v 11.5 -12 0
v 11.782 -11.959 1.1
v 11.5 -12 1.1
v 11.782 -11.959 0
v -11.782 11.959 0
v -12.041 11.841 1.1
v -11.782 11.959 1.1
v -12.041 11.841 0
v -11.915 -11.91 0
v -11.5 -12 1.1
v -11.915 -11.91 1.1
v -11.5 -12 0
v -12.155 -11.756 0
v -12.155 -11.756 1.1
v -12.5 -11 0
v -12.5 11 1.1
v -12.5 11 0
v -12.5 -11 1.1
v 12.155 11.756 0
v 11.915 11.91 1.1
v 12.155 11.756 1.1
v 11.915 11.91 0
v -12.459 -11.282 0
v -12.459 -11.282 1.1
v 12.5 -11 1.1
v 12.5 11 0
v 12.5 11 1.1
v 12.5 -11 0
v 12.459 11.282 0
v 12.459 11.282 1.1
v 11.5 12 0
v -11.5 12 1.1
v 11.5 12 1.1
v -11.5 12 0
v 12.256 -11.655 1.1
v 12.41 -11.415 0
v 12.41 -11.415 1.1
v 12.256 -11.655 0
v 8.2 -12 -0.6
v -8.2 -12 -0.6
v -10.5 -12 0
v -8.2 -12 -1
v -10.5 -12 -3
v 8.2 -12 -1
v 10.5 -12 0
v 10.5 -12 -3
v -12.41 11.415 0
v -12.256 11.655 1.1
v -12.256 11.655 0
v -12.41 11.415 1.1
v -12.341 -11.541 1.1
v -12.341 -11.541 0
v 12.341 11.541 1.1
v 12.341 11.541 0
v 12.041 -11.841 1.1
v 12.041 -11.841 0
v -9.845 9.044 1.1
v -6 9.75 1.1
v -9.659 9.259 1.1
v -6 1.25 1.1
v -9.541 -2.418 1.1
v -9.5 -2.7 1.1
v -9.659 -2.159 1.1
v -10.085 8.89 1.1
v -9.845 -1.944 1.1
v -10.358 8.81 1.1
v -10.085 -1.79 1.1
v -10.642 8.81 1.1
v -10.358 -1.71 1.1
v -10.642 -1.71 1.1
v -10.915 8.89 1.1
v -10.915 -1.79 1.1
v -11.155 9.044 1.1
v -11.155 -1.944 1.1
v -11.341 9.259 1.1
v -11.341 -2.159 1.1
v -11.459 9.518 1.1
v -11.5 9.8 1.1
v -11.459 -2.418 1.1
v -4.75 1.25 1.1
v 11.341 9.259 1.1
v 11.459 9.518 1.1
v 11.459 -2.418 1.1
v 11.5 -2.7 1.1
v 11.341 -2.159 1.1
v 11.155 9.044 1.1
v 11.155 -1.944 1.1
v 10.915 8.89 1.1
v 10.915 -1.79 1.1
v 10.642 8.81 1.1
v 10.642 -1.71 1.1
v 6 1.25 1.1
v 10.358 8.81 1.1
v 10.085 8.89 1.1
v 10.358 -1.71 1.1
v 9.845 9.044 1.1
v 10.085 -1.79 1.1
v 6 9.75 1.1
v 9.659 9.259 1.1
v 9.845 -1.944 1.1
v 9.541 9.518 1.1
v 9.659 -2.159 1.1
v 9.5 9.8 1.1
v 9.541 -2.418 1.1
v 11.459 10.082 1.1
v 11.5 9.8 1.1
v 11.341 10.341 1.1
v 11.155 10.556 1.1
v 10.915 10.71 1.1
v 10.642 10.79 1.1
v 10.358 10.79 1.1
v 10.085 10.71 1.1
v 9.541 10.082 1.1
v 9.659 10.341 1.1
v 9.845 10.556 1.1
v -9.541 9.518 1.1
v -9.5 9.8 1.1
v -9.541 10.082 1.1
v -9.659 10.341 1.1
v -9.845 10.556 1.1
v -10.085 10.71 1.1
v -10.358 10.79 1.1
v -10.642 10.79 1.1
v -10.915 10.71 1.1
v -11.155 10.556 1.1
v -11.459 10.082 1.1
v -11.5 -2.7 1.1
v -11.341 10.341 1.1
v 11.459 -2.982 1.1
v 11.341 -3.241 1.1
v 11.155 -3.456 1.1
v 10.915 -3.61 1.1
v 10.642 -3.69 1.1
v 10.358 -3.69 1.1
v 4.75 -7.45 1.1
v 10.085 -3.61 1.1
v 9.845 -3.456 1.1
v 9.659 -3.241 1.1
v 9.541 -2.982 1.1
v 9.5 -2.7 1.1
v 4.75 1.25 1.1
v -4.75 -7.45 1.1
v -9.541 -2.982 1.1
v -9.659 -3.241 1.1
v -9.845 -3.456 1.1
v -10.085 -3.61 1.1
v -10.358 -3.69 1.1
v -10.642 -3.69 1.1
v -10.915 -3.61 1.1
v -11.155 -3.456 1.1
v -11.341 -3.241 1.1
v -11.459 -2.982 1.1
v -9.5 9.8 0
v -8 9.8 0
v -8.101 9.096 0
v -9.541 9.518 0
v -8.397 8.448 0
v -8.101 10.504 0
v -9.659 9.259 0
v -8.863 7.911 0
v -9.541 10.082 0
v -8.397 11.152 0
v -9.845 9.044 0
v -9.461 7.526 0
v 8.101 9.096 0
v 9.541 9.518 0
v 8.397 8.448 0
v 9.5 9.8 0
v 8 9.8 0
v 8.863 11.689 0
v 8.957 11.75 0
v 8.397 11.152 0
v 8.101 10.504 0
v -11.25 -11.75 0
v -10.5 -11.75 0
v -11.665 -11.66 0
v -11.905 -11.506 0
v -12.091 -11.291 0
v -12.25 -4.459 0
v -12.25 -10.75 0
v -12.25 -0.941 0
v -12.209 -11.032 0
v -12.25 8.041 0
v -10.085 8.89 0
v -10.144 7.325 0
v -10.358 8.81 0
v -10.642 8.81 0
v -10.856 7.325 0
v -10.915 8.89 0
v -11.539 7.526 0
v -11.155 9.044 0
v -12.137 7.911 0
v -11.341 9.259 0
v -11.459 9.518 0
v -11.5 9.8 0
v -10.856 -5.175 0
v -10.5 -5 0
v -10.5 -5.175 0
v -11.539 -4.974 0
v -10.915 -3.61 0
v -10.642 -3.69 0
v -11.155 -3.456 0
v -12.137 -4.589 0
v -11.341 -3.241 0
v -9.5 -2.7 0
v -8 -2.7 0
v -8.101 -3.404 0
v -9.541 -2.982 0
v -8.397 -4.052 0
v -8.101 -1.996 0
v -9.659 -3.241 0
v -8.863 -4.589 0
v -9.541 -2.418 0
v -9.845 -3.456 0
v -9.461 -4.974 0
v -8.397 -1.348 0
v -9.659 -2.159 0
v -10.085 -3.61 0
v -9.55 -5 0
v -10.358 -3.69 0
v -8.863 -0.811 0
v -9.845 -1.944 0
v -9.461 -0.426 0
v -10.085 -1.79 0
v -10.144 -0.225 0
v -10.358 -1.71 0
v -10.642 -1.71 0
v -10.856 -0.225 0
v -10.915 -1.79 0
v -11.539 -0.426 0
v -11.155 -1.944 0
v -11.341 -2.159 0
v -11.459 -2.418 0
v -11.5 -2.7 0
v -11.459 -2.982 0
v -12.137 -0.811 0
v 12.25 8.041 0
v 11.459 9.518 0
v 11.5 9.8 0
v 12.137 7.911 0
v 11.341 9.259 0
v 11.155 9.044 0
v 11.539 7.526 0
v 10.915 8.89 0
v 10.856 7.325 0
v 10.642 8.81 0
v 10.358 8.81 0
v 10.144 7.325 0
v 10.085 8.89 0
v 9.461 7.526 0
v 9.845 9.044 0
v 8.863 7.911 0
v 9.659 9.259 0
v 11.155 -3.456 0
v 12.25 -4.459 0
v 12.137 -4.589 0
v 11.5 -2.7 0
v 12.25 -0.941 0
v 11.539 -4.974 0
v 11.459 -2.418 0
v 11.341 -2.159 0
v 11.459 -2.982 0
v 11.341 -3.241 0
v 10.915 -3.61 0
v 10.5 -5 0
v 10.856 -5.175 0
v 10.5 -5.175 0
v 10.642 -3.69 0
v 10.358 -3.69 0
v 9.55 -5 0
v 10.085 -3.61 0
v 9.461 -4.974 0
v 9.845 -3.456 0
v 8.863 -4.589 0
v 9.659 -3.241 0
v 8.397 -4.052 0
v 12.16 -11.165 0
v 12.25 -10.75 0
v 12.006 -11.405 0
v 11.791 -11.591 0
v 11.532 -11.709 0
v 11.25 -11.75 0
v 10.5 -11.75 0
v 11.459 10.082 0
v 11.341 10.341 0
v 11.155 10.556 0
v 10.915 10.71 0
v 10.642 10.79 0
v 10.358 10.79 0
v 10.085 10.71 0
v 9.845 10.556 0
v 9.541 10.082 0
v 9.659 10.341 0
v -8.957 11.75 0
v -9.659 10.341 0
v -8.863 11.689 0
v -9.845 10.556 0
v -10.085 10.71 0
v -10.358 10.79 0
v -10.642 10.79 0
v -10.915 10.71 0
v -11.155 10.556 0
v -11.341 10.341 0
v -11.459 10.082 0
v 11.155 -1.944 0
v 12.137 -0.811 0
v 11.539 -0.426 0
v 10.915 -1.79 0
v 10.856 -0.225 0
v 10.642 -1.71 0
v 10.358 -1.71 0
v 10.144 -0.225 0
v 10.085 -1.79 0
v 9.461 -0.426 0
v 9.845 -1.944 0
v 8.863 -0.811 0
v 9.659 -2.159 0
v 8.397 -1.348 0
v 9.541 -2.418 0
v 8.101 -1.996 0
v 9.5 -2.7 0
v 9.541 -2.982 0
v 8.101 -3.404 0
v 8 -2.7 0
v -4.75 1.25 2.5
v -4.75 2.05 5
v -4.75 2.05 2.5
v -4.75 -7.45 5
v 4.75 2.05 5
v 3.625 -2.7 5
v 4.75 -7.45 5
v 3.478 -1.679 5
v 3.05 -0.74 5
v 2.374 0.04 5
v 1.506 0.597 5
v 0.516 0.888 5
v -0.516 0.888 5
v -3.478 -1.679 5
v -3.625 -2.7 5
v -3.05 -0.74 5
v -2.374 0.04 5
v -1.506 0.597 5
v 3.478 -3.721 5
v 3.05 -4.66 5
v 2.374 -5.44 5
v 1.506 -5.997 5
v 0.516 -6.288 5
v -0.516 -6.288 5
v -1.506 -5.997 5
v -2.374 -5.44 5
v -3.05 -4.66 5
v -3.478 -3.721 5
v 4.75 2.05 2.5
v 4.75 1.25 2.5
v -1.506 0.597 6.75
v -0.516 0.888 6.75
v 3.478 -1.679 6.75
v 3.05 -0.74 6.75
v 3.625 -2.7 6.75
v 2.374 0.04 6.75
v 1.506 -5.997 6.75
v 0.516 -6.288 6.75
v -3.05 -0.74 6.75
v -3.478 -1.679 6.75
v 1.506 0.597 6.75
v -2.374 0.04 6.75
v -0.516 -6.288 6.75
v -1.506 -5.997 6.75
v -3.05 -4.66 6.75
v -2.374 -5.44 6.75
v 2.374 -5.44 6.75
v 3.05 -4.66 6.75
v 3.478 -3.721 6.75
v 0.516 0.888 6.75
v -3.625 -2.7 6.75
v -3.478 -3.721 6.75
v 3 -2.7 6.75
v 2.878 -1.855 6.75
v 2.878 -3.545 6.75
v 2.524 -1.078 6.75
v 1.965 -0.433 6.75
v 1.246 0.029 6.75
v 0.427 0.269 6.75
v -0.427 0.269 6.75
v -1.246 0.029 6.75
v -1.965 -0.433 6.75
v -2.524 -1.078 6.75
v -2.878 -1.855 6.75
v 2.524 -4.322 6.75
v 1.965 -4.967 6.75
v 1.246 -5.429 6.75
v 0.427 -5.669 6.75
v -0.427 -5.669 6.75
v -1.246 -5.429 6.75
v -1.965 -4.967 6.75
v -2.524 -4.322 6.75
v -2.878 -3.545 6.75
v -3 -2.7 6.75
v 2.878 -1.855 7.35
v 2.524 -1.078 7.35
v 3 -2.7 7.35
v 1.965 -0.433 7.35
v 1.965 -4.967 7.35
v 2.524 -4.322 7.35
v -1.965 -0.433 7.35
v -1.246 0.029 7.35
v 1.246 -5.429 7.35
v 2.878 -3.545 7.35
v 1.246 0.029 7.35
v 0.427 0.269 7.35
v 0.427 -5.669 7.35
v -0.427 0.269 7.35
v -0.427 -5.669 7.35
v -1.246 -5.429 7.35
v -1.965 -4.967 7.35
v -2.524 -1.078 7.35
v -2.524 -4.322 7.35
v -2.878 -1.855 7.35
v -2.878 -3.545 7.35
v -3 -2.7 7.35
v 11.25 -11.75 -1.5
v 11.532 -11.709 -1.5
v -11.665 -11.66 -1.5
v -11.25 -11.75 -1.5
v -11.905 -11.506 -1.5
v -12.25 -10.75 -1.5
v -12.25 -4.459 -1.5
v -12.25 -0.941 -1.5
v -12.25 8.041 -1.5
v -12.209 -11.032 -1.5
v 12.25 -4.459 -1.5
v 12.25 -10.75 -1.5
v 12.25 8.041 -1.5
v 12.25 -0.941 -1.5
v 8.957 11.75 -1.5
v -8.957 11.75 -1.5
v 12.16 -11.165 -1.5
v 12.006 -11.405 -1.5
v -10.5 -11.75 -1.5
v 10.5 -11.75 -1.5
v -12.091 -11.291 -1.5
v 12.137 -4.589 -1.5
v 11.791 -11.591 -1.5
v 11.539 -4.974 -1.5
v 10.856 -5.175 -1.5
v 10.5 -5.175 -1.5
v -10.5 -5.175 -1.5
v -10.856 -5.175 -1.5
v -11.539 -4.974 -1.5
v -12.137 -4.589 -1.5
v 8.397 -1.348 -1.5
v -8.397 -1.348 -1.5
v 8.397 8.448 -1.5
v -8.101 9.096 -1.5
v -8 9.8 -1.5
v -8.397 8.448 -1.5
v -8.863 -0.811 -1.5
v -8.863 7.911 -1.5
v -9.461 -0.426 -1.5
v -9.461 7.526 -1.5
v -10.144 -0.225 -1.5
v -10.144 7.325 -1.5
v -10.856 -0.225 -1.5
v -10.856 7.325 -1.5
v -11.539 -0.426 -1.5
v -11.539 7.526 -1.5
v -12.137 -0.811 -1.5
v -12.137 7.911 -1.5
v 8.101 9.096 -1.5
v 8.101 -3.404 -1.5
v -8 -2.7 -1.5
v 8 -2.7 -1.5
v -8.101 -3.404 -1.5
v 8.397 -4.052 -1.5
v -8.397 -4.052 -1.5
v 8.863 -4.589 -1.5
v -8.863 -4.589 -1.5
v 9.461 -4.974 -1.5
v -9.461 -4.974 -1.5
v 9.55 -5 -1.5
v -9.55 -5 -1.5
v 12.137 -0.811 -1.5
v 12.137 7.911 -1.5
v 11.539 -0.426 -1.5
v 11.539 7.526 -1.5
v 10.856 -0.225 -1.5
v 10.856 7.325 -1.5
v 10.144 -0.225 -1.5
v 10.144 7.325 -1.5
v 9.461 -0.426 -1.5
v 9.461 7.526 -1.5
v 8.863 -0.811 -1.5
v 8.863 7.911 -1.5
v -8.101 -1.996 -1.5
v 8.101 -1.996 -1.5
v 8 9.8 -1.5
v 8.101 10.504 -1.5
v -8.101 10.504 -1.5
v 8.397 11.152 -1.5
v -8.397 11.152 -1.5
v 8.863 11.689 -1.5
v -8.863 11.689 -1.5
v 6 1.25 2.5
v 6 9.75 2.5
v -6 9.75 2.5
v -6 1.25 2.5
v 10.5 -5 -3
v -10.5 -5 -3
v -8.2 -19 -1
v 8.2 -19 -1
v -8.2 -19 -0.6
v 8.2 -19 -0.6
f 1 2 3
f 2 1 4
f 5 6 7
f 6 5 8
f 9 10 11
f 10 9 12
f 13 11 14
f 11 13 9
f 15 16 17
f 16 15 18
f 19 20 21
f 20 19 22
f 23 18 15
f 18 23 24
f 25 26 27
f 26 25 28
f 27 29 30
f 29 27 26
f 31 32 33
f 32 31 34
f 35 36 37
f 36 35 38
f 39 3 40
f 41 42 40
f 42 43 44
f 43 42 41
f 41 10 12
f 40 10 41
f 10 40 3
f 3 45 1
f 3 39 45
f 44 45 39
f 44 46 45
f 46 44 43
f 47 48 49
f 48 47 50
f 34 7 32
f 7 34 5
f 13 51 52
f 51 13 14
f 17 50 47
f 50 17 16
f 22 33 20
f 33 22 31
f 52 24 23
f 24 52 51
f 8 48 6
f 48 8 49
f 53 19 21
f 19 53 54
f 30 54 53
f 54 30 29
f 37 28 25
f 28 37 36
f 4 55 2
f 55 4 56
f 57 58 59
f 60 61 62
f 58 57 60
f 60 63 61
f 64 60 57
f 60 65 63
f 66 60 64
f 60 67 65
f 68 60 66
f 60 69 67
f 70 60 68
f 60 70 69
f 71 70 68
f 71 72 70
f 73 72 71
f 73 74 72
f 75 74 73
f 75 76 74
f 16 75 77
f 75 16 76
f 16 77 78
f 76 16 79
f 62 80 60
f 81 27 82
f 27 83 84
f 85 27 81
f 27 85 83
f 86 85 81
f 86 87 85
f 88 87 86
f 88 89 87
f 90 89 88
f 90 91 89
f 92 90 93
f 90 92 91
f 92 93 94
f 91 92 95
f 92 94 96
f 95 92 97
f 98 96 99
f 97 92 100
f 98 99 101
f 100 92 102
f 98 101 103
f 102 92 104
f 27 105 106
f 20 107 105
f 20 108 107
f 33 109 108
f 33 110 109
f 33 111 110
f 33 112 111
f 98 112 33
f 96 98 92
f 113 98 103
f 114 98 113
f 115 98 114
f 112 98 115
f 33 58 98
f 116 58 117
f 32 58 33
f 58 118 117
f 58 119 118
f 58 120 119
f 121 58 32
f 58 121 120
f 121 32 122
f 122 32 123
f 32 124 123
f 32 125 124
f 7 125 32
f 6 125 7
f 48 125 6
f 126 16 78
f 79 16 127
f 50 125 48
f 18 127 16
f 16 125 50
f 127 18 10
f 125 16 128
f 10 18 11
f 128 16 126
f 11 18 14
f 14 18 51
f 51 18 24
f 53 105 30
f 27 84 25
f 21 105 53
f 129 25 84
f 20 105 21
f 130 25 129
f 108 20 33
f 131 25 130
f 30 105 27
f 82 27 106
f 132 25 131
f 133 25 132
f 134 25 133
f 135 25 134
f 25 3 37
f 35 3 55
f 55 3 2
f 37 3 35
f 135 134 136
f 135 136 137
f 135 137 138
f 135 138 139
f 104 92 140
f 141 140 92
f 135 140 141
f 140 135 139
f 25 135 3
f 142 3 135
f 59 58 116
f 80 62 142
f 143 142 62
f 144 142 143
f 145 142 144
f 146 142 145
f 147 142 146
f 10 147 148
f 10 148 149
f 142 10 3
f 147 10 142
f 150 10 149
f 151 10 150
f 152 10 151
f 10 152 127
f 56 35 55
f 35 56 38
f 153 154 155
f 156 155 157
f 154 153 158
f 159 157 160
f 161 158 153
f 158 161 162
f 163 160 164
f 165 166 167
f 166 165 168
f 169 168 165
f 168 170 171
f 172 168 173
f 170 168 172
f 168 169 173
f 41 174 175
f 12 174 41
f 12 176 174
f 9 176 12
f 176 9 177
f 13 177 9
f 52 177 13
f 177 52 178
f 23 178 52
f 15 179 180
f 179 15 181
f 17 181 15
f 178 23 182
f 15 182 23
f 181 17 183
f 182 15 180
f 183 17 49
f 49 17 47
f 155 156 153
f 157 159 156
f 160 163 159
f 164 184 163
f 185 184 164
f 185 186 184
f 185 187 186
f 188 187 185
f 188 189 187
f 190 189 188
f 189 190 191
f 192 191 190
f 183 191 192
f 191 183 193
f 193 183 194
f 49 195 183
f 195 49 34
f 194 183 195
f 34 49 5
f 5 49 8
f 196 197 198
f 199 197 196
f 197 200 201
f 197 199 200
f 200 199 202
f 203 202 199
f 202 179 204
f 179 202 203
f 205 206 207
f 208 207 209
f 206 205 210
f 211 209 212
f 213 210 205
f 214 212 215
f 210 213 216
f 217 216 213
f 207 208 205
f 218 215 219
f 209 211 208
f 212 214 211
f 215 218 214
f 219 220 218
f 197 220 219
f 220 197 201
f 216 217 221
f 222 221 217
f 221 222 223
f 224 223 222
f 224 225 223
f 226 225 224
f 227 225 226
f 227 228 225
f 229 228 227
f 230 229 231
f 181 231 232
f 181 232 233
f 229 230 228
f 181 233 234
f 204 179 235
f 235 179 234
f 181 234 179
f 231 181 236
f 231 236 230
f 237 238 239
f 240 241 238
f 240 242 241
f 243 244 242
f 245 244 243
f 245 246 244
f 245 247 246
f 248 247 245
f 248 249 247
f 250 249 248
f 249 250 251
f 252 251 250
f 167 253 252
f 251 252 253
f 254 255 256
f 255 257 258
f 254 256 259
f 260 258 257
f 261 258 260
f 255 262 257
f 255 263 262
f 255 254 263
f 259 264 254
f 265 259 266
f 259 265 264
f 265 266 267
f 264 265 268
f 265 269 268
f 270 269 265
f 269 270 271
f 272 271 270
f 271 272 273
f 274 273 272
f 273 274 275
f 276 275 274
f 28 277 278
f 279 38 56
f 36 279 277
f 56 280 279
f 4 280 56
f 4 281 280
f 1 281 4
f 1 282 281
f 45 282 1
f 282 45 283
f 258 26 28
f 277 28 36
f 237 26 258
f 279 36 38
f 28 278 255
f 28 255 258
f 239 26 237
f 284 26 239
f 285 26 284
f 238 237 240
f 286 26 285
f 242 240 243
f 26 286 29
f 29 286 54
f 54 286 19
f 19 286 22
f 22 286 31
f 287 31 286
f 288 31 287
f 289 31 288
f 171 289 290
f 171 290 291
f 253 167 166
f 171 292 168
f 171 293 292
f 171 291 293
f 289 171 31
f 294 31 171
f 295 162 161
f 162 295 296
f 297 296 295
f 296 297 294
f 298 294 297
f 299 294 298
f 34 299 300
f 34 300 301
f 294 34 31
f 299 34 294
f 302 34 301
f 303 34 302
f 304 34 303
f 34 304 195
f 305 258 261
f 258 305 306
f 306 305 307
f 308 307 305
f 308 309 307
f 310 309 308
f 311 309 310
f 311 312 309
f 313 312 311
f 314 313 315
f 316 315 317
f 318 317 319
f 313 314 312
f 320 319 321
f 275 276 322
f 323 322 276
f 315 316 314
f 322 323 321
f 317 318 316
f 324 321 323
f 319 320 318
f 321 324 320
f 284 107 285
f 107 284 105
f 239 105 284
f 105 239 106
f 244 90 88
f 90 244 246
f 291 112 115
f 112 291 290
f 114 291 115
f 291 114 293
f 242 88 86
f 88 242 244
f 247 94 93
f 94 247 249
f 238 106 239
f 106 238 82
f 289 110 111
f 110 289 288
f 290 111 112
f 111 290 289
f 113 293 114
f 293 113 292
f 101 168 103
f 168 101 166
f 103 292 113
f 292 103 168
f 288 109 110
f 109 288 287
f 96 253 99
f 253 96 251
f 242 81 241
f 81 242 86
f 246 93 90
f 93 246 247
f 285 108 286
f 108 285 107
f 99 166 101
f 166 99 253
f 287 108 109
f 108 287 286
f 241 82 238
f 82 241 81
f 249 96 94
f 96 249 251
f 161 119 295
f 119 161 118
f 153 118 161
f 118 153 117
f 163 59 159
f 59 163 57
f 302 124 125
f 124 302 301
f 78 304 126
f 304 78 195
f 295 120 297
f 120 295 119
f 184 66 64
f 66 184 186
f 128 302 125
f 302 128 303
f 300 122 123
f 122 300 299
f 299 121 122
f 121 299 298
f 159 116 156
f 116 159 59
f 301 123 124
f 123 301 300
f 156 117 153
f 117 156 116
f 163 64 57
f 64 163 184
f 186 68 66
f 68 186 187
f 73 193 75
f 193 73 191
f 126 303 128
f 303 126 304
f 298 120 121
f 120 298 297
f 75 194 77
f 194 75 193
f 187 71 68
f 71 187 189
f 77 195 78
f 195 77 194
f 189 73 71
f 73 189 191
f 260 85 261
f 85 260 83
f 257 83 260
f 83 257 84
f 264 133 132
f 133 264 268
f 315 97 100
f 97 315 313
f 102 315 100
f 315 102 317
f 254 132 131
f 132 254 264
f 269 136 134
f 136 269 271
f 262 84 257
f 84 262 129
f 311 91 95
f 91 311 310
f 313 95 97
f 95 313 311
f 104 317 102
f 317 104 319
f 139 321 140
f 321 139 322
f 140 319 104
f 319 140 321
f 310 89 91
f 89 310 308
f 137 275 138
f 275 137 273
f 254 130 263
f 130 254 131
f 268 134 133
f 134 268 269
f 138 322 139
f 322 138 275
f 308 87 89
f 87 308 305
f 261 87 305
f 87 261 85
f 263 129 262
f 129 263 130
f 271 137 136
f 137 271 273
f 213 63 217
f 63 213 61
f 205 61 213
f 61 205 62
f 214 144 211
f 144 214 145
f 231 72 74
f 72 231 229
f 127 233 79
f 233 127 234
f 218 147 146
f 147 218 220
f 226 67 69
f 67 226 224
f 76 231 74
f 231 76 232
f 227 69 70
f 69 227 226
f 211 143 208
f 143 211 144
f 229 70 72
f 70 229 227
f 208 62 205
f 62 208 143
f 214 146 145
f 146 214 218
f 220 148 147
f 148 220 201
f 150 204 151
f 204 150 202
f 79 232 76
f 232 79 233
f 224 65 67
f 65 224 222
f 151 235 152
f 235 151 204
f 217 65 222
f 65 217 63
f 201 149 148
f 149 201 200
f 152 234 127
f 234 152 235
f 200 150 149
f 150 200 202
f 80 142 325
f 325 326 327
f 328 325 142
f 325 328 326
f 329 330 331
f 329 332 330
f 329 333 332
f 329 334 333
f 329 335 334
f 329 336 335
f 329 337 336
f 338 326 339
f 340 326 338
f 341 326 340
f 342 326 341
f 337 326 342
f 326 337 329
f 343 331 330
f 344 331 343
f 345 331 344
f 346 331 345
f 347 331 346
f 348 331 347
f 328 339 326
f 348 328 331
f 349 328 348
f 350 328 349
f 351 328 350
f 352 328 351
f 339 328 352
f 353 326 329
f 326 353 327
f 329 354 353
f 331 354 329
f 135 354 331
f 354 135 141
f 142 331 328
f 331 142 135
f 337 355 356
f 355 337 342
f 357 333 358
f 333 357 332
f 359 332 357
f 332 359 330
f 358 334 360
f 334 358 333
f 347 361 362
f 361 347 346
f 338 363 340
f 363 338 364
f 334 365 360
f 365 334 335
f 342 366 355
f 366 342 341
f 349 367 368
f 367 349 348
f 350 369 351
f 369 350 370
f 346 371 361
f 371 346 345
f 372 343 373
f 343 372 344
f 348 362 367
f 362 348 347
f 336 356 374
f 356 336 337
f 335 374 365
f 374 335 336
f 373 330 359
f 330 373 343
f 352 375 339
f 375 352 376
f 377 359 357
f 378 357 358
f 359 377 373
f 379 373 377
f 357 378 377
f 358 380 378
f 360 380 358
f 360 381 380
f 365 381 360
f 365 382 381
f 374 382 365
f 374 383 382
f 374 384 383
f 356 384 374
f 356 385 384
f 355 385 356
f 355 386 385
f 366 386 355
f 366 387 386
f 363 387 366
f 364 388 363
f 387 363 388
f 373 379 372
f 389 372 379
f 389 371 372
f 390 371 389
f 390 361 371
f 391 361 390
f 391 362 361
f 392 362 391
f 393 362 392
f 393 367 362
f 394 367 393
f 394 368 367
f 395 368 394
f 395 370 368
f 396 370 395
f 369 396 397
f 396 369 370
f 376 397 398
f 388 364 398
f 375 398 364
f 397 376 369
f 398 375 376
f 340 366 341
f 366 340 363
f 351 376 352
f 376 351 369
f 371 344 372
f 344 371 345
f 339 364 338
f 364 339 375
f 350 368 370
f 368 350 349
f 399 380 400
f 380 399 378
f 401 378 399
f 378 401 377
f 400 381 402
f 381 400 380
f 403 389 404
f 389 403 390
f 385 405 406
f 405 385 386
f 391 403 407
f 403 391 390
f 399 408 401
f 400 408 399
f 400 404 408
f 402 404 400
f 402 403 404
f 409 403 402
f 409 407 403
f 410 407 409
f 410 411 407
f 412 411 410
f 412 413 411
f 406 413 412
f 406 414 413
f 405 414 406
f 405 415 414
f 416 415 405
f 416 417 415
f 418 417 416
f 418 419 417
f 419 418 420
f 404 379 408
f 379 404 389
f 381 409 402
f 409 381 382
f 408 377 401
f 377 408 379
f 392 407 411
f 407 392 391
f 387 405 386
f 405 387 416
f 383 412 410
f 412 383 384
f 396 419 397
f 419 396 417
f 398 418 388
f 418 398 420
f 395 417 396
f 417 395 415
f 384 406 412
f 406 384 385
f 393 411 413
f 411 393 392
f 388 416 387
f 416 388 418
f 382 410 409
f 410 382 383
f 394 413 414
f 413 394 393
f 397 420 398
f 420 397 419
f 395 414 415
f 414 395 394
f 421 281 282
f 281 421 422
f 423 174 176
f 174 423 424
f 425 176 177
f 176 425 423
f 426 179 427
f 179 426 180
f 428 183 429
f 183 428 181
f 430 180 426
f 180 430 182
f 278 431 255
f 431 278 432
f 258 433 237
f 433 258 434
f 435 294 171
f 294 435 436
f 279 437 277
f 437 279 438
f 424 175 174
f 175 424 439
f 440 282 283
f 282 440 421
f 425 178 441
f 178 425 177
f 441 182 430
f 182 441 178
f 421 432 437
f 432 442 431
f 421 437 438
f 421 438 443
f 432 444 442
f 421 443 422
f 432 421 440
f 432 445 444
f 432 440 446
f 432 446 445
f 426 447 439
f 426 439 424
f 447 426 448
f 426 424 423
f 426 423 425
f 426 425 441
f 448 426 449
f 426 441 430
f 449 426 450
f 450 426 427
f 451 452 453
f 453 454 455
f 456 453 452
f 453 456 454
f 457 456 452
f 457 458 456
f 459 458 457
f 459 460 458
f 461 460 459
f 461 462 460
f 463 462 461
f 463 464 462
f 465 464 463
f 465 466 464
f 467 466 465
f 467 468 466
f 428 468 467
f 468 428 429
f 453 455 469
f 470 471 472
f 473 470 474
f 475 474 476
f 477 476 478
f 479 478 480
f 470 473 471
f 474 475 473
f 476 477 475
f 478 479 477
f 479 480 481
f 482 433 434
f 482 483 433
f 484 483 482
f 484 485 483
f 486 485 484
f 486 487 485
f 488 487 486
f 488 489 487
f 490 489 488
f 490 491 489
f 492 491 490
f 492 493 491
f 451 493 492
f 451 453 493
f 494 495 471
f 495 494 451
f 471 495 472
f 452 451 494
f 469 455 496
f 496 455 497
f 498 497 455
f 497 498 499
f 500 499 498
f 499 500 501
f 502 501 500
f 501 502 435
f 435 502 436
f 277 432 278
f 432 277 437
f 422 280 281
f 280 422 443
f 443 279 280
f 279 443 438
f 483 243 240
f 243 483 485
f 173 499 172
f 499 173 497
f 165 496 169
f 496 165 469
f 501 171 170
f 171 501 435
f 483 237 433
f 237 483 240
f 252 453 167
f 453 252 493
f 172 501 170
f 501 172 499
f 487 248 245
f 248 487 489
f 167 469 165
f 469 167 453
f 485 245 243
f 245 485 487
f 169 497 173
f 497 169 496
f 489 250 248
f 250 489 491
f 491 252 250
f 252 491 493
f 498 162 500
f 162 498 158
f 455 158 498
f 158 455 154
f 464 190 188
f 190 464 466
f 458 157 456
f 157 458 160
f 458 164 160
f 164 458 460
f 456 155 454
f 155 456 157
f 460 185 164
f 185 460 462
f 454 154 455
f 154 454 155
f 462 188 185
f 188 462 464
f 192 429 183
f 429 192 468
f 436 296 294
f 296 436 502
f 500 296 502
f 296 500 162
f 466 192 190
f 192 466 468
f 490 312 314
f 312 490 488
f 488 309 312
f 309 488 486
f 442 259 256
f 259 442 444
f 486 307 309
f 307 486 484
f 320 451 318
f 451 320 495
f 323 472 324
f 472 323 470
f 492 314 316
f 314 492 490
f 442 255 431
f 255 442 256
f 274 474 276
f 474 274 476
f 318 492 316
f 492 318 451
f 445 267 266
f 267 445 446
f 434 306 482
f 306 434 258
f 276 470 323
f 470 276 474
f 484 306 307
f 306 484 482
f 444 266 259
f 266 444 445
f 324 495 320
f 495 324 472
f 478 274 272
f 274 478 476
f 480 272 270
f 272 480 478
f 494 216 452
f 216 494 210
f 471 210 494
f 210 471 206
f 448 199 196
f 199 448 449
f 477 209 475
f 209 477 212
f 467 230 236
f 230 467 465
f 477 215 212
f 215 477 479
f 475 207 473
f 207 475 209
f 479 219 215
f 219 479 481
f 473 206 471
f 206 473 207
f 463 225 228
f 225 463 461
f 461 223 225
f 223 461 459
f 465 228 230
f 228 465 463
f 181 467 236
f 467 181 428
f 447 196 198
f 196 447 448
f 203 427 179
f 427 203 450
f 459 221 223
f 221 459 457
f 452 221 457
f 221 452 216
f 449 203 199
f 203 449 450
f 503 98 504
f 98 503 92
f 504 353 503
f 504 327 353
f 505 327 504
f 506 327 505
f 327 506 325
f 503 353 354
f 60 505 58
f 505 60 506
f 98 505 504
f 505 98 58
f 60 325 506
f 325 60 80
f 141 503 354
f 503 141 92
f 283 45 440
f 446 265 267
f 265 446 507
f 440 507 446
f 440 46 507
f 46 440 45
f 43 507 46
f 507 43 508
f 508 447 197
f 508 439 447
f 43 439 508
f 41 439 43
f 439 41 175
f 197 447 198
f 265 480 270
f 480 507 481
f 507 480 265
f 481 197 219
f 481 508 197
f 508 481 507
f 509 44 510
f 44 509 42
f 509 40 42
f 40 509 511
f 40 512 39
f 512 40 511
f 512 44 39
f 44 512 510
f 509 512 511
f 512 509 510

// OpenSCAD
// cam1
// models for the picamera v2.1

//----------------------------
module cam1(){
difference(){
    linear_extrude(height=1.1)
    offset(r=1,$fn=22)
    square([23,22],center=true);

    translate([10.5,9.8,0])
    cylinder(r=1,h=3,$fn=22);

    translate([-10.5,9.8,0])
    cylinder(r=1,h=3,$fn=22);

    translate([10.5,9.8-12.5,0])
    cylinder(r=1,h=3,$fn=22);

    translate([-10.5,9.8-12.5,0])
    cylinder(r=1,h=3,$fn=22);
}

// lens and box
translate([0,-2.7,0]){
    linear_extrude(height=5)
    square([9.5,9.5],center=true);
    cylinder(r=7.25/2,h=6.75,$fn=22);
    cylinder(r=6/2,h=6.75+0.6,$fn=22);
}

// cable off lens box
color("red")
translate([0,5.5,1.25])
cube([12,8.5,2.5],center=true);

// main cable
color("green")
translate([0,-12+3.5,-1.5])
cube([21,7,3],center=true);

// ribbon if needed
color("orange")
translate([0,-14,-1])
linear_extrude(height=0.4)
square([16.4,10],center=true);

// component clearance on backside
color("red")
translate([0,0,-1.5])
difference(){
    linear_extrude(height=1.5)
    offset(r=1,$fn=22)
    square([23-0.5,22-0.5],center=true);

    translate([10.5,9.8,0])
    cylinder(r=2.5,h=1.5,$fn=22);

    translate([-10.5,9.8,0])
    cylinder(r=2.5,h=1.5,$fn=22);

    translate([10.5,9.8-12.5,0])
    cylinder(r=2.5,h=1.5,$fn=22);

    translate([-10.5,9.8-12.5,0])
    cylinder(r=2.5,h=1.5,$fn=22);
}
} //---------- end module cam1 ----------

module cam1cut(tol=0.1){
difference(){
    linear_extrude(height=1.1+tol)
    offset(r=1,$fn=22)
    square([23+tol,22+tol],center=true);

    translate([10.5,9.8,0])
    cylinder(r=1-tol,h=3,$fn=22);

    translate([-10.5,9.8,0])
    cylinder(r=1-tol,h=3,$fn=22);

    translate([10.5,9.8-12.5,0])
    cylinder(r=1-tol,h=3,$fn=22);

    translate([-10.5,9.8-12.5,0])
    cylinder(r=1-tol,h=3,$fn=22);
}

// lens and box
translate([0,-2.7,0]){
    linear_extrude(height=5+tol)
    square([9.5+tol,9.5+tol],center=true);
    cylinder(r=7.25/2+tol/2,h=6.75+tol,$fn=22);
    cylinder(r=6/2+tol/2,h=6.75+0.6+tol,$fn=22);
}

// cable off lens box
translate([0,5.5,1.25])
cube([12+tol,8.5+tol,2.5+tol],center=true);

// main cable
color("green")
translate([0,-12+3.5,-1.5])
cube([21+tol,7+tol,3+tol],center=true);

// ribbon if needed
color("orange")
translate([0,-14,-1])
linear_extrude(height=0.4+tol)
square([16.4+tol,10+tol],center=true);

// component clearance on backside
color("red")
translate([0,0,-1.5-tol])
difference(){
    linear_extrude(height=1.5+tol)
    offset(r=1,$fn=22)
    square([23-0.5+tol,22-0.5+tol],center=true);

    translate([10.5,9.8,0])
    cylinder(r=2.5,h=1.5+tol,$fn=22);

    translate([-10.5,9.8,0])
    cylinder(r=2.5,h=1.5+tol,$fn=22);

    translate([10.5,9.8-12.5,0])
    cylinder(r=2.5,h=1.5+tol,$fn=22);

    translate([-10.5,9.8-12.5,0])
    cylinder(r=2.5,h=1.5+tol,$fn=22);
}
} //---------- end module cam1cut ----------

/*
difference(){
    cam1cut();
cam1();
}
*/
cam1();

//translate([35,0,0])
//cam1cut();
